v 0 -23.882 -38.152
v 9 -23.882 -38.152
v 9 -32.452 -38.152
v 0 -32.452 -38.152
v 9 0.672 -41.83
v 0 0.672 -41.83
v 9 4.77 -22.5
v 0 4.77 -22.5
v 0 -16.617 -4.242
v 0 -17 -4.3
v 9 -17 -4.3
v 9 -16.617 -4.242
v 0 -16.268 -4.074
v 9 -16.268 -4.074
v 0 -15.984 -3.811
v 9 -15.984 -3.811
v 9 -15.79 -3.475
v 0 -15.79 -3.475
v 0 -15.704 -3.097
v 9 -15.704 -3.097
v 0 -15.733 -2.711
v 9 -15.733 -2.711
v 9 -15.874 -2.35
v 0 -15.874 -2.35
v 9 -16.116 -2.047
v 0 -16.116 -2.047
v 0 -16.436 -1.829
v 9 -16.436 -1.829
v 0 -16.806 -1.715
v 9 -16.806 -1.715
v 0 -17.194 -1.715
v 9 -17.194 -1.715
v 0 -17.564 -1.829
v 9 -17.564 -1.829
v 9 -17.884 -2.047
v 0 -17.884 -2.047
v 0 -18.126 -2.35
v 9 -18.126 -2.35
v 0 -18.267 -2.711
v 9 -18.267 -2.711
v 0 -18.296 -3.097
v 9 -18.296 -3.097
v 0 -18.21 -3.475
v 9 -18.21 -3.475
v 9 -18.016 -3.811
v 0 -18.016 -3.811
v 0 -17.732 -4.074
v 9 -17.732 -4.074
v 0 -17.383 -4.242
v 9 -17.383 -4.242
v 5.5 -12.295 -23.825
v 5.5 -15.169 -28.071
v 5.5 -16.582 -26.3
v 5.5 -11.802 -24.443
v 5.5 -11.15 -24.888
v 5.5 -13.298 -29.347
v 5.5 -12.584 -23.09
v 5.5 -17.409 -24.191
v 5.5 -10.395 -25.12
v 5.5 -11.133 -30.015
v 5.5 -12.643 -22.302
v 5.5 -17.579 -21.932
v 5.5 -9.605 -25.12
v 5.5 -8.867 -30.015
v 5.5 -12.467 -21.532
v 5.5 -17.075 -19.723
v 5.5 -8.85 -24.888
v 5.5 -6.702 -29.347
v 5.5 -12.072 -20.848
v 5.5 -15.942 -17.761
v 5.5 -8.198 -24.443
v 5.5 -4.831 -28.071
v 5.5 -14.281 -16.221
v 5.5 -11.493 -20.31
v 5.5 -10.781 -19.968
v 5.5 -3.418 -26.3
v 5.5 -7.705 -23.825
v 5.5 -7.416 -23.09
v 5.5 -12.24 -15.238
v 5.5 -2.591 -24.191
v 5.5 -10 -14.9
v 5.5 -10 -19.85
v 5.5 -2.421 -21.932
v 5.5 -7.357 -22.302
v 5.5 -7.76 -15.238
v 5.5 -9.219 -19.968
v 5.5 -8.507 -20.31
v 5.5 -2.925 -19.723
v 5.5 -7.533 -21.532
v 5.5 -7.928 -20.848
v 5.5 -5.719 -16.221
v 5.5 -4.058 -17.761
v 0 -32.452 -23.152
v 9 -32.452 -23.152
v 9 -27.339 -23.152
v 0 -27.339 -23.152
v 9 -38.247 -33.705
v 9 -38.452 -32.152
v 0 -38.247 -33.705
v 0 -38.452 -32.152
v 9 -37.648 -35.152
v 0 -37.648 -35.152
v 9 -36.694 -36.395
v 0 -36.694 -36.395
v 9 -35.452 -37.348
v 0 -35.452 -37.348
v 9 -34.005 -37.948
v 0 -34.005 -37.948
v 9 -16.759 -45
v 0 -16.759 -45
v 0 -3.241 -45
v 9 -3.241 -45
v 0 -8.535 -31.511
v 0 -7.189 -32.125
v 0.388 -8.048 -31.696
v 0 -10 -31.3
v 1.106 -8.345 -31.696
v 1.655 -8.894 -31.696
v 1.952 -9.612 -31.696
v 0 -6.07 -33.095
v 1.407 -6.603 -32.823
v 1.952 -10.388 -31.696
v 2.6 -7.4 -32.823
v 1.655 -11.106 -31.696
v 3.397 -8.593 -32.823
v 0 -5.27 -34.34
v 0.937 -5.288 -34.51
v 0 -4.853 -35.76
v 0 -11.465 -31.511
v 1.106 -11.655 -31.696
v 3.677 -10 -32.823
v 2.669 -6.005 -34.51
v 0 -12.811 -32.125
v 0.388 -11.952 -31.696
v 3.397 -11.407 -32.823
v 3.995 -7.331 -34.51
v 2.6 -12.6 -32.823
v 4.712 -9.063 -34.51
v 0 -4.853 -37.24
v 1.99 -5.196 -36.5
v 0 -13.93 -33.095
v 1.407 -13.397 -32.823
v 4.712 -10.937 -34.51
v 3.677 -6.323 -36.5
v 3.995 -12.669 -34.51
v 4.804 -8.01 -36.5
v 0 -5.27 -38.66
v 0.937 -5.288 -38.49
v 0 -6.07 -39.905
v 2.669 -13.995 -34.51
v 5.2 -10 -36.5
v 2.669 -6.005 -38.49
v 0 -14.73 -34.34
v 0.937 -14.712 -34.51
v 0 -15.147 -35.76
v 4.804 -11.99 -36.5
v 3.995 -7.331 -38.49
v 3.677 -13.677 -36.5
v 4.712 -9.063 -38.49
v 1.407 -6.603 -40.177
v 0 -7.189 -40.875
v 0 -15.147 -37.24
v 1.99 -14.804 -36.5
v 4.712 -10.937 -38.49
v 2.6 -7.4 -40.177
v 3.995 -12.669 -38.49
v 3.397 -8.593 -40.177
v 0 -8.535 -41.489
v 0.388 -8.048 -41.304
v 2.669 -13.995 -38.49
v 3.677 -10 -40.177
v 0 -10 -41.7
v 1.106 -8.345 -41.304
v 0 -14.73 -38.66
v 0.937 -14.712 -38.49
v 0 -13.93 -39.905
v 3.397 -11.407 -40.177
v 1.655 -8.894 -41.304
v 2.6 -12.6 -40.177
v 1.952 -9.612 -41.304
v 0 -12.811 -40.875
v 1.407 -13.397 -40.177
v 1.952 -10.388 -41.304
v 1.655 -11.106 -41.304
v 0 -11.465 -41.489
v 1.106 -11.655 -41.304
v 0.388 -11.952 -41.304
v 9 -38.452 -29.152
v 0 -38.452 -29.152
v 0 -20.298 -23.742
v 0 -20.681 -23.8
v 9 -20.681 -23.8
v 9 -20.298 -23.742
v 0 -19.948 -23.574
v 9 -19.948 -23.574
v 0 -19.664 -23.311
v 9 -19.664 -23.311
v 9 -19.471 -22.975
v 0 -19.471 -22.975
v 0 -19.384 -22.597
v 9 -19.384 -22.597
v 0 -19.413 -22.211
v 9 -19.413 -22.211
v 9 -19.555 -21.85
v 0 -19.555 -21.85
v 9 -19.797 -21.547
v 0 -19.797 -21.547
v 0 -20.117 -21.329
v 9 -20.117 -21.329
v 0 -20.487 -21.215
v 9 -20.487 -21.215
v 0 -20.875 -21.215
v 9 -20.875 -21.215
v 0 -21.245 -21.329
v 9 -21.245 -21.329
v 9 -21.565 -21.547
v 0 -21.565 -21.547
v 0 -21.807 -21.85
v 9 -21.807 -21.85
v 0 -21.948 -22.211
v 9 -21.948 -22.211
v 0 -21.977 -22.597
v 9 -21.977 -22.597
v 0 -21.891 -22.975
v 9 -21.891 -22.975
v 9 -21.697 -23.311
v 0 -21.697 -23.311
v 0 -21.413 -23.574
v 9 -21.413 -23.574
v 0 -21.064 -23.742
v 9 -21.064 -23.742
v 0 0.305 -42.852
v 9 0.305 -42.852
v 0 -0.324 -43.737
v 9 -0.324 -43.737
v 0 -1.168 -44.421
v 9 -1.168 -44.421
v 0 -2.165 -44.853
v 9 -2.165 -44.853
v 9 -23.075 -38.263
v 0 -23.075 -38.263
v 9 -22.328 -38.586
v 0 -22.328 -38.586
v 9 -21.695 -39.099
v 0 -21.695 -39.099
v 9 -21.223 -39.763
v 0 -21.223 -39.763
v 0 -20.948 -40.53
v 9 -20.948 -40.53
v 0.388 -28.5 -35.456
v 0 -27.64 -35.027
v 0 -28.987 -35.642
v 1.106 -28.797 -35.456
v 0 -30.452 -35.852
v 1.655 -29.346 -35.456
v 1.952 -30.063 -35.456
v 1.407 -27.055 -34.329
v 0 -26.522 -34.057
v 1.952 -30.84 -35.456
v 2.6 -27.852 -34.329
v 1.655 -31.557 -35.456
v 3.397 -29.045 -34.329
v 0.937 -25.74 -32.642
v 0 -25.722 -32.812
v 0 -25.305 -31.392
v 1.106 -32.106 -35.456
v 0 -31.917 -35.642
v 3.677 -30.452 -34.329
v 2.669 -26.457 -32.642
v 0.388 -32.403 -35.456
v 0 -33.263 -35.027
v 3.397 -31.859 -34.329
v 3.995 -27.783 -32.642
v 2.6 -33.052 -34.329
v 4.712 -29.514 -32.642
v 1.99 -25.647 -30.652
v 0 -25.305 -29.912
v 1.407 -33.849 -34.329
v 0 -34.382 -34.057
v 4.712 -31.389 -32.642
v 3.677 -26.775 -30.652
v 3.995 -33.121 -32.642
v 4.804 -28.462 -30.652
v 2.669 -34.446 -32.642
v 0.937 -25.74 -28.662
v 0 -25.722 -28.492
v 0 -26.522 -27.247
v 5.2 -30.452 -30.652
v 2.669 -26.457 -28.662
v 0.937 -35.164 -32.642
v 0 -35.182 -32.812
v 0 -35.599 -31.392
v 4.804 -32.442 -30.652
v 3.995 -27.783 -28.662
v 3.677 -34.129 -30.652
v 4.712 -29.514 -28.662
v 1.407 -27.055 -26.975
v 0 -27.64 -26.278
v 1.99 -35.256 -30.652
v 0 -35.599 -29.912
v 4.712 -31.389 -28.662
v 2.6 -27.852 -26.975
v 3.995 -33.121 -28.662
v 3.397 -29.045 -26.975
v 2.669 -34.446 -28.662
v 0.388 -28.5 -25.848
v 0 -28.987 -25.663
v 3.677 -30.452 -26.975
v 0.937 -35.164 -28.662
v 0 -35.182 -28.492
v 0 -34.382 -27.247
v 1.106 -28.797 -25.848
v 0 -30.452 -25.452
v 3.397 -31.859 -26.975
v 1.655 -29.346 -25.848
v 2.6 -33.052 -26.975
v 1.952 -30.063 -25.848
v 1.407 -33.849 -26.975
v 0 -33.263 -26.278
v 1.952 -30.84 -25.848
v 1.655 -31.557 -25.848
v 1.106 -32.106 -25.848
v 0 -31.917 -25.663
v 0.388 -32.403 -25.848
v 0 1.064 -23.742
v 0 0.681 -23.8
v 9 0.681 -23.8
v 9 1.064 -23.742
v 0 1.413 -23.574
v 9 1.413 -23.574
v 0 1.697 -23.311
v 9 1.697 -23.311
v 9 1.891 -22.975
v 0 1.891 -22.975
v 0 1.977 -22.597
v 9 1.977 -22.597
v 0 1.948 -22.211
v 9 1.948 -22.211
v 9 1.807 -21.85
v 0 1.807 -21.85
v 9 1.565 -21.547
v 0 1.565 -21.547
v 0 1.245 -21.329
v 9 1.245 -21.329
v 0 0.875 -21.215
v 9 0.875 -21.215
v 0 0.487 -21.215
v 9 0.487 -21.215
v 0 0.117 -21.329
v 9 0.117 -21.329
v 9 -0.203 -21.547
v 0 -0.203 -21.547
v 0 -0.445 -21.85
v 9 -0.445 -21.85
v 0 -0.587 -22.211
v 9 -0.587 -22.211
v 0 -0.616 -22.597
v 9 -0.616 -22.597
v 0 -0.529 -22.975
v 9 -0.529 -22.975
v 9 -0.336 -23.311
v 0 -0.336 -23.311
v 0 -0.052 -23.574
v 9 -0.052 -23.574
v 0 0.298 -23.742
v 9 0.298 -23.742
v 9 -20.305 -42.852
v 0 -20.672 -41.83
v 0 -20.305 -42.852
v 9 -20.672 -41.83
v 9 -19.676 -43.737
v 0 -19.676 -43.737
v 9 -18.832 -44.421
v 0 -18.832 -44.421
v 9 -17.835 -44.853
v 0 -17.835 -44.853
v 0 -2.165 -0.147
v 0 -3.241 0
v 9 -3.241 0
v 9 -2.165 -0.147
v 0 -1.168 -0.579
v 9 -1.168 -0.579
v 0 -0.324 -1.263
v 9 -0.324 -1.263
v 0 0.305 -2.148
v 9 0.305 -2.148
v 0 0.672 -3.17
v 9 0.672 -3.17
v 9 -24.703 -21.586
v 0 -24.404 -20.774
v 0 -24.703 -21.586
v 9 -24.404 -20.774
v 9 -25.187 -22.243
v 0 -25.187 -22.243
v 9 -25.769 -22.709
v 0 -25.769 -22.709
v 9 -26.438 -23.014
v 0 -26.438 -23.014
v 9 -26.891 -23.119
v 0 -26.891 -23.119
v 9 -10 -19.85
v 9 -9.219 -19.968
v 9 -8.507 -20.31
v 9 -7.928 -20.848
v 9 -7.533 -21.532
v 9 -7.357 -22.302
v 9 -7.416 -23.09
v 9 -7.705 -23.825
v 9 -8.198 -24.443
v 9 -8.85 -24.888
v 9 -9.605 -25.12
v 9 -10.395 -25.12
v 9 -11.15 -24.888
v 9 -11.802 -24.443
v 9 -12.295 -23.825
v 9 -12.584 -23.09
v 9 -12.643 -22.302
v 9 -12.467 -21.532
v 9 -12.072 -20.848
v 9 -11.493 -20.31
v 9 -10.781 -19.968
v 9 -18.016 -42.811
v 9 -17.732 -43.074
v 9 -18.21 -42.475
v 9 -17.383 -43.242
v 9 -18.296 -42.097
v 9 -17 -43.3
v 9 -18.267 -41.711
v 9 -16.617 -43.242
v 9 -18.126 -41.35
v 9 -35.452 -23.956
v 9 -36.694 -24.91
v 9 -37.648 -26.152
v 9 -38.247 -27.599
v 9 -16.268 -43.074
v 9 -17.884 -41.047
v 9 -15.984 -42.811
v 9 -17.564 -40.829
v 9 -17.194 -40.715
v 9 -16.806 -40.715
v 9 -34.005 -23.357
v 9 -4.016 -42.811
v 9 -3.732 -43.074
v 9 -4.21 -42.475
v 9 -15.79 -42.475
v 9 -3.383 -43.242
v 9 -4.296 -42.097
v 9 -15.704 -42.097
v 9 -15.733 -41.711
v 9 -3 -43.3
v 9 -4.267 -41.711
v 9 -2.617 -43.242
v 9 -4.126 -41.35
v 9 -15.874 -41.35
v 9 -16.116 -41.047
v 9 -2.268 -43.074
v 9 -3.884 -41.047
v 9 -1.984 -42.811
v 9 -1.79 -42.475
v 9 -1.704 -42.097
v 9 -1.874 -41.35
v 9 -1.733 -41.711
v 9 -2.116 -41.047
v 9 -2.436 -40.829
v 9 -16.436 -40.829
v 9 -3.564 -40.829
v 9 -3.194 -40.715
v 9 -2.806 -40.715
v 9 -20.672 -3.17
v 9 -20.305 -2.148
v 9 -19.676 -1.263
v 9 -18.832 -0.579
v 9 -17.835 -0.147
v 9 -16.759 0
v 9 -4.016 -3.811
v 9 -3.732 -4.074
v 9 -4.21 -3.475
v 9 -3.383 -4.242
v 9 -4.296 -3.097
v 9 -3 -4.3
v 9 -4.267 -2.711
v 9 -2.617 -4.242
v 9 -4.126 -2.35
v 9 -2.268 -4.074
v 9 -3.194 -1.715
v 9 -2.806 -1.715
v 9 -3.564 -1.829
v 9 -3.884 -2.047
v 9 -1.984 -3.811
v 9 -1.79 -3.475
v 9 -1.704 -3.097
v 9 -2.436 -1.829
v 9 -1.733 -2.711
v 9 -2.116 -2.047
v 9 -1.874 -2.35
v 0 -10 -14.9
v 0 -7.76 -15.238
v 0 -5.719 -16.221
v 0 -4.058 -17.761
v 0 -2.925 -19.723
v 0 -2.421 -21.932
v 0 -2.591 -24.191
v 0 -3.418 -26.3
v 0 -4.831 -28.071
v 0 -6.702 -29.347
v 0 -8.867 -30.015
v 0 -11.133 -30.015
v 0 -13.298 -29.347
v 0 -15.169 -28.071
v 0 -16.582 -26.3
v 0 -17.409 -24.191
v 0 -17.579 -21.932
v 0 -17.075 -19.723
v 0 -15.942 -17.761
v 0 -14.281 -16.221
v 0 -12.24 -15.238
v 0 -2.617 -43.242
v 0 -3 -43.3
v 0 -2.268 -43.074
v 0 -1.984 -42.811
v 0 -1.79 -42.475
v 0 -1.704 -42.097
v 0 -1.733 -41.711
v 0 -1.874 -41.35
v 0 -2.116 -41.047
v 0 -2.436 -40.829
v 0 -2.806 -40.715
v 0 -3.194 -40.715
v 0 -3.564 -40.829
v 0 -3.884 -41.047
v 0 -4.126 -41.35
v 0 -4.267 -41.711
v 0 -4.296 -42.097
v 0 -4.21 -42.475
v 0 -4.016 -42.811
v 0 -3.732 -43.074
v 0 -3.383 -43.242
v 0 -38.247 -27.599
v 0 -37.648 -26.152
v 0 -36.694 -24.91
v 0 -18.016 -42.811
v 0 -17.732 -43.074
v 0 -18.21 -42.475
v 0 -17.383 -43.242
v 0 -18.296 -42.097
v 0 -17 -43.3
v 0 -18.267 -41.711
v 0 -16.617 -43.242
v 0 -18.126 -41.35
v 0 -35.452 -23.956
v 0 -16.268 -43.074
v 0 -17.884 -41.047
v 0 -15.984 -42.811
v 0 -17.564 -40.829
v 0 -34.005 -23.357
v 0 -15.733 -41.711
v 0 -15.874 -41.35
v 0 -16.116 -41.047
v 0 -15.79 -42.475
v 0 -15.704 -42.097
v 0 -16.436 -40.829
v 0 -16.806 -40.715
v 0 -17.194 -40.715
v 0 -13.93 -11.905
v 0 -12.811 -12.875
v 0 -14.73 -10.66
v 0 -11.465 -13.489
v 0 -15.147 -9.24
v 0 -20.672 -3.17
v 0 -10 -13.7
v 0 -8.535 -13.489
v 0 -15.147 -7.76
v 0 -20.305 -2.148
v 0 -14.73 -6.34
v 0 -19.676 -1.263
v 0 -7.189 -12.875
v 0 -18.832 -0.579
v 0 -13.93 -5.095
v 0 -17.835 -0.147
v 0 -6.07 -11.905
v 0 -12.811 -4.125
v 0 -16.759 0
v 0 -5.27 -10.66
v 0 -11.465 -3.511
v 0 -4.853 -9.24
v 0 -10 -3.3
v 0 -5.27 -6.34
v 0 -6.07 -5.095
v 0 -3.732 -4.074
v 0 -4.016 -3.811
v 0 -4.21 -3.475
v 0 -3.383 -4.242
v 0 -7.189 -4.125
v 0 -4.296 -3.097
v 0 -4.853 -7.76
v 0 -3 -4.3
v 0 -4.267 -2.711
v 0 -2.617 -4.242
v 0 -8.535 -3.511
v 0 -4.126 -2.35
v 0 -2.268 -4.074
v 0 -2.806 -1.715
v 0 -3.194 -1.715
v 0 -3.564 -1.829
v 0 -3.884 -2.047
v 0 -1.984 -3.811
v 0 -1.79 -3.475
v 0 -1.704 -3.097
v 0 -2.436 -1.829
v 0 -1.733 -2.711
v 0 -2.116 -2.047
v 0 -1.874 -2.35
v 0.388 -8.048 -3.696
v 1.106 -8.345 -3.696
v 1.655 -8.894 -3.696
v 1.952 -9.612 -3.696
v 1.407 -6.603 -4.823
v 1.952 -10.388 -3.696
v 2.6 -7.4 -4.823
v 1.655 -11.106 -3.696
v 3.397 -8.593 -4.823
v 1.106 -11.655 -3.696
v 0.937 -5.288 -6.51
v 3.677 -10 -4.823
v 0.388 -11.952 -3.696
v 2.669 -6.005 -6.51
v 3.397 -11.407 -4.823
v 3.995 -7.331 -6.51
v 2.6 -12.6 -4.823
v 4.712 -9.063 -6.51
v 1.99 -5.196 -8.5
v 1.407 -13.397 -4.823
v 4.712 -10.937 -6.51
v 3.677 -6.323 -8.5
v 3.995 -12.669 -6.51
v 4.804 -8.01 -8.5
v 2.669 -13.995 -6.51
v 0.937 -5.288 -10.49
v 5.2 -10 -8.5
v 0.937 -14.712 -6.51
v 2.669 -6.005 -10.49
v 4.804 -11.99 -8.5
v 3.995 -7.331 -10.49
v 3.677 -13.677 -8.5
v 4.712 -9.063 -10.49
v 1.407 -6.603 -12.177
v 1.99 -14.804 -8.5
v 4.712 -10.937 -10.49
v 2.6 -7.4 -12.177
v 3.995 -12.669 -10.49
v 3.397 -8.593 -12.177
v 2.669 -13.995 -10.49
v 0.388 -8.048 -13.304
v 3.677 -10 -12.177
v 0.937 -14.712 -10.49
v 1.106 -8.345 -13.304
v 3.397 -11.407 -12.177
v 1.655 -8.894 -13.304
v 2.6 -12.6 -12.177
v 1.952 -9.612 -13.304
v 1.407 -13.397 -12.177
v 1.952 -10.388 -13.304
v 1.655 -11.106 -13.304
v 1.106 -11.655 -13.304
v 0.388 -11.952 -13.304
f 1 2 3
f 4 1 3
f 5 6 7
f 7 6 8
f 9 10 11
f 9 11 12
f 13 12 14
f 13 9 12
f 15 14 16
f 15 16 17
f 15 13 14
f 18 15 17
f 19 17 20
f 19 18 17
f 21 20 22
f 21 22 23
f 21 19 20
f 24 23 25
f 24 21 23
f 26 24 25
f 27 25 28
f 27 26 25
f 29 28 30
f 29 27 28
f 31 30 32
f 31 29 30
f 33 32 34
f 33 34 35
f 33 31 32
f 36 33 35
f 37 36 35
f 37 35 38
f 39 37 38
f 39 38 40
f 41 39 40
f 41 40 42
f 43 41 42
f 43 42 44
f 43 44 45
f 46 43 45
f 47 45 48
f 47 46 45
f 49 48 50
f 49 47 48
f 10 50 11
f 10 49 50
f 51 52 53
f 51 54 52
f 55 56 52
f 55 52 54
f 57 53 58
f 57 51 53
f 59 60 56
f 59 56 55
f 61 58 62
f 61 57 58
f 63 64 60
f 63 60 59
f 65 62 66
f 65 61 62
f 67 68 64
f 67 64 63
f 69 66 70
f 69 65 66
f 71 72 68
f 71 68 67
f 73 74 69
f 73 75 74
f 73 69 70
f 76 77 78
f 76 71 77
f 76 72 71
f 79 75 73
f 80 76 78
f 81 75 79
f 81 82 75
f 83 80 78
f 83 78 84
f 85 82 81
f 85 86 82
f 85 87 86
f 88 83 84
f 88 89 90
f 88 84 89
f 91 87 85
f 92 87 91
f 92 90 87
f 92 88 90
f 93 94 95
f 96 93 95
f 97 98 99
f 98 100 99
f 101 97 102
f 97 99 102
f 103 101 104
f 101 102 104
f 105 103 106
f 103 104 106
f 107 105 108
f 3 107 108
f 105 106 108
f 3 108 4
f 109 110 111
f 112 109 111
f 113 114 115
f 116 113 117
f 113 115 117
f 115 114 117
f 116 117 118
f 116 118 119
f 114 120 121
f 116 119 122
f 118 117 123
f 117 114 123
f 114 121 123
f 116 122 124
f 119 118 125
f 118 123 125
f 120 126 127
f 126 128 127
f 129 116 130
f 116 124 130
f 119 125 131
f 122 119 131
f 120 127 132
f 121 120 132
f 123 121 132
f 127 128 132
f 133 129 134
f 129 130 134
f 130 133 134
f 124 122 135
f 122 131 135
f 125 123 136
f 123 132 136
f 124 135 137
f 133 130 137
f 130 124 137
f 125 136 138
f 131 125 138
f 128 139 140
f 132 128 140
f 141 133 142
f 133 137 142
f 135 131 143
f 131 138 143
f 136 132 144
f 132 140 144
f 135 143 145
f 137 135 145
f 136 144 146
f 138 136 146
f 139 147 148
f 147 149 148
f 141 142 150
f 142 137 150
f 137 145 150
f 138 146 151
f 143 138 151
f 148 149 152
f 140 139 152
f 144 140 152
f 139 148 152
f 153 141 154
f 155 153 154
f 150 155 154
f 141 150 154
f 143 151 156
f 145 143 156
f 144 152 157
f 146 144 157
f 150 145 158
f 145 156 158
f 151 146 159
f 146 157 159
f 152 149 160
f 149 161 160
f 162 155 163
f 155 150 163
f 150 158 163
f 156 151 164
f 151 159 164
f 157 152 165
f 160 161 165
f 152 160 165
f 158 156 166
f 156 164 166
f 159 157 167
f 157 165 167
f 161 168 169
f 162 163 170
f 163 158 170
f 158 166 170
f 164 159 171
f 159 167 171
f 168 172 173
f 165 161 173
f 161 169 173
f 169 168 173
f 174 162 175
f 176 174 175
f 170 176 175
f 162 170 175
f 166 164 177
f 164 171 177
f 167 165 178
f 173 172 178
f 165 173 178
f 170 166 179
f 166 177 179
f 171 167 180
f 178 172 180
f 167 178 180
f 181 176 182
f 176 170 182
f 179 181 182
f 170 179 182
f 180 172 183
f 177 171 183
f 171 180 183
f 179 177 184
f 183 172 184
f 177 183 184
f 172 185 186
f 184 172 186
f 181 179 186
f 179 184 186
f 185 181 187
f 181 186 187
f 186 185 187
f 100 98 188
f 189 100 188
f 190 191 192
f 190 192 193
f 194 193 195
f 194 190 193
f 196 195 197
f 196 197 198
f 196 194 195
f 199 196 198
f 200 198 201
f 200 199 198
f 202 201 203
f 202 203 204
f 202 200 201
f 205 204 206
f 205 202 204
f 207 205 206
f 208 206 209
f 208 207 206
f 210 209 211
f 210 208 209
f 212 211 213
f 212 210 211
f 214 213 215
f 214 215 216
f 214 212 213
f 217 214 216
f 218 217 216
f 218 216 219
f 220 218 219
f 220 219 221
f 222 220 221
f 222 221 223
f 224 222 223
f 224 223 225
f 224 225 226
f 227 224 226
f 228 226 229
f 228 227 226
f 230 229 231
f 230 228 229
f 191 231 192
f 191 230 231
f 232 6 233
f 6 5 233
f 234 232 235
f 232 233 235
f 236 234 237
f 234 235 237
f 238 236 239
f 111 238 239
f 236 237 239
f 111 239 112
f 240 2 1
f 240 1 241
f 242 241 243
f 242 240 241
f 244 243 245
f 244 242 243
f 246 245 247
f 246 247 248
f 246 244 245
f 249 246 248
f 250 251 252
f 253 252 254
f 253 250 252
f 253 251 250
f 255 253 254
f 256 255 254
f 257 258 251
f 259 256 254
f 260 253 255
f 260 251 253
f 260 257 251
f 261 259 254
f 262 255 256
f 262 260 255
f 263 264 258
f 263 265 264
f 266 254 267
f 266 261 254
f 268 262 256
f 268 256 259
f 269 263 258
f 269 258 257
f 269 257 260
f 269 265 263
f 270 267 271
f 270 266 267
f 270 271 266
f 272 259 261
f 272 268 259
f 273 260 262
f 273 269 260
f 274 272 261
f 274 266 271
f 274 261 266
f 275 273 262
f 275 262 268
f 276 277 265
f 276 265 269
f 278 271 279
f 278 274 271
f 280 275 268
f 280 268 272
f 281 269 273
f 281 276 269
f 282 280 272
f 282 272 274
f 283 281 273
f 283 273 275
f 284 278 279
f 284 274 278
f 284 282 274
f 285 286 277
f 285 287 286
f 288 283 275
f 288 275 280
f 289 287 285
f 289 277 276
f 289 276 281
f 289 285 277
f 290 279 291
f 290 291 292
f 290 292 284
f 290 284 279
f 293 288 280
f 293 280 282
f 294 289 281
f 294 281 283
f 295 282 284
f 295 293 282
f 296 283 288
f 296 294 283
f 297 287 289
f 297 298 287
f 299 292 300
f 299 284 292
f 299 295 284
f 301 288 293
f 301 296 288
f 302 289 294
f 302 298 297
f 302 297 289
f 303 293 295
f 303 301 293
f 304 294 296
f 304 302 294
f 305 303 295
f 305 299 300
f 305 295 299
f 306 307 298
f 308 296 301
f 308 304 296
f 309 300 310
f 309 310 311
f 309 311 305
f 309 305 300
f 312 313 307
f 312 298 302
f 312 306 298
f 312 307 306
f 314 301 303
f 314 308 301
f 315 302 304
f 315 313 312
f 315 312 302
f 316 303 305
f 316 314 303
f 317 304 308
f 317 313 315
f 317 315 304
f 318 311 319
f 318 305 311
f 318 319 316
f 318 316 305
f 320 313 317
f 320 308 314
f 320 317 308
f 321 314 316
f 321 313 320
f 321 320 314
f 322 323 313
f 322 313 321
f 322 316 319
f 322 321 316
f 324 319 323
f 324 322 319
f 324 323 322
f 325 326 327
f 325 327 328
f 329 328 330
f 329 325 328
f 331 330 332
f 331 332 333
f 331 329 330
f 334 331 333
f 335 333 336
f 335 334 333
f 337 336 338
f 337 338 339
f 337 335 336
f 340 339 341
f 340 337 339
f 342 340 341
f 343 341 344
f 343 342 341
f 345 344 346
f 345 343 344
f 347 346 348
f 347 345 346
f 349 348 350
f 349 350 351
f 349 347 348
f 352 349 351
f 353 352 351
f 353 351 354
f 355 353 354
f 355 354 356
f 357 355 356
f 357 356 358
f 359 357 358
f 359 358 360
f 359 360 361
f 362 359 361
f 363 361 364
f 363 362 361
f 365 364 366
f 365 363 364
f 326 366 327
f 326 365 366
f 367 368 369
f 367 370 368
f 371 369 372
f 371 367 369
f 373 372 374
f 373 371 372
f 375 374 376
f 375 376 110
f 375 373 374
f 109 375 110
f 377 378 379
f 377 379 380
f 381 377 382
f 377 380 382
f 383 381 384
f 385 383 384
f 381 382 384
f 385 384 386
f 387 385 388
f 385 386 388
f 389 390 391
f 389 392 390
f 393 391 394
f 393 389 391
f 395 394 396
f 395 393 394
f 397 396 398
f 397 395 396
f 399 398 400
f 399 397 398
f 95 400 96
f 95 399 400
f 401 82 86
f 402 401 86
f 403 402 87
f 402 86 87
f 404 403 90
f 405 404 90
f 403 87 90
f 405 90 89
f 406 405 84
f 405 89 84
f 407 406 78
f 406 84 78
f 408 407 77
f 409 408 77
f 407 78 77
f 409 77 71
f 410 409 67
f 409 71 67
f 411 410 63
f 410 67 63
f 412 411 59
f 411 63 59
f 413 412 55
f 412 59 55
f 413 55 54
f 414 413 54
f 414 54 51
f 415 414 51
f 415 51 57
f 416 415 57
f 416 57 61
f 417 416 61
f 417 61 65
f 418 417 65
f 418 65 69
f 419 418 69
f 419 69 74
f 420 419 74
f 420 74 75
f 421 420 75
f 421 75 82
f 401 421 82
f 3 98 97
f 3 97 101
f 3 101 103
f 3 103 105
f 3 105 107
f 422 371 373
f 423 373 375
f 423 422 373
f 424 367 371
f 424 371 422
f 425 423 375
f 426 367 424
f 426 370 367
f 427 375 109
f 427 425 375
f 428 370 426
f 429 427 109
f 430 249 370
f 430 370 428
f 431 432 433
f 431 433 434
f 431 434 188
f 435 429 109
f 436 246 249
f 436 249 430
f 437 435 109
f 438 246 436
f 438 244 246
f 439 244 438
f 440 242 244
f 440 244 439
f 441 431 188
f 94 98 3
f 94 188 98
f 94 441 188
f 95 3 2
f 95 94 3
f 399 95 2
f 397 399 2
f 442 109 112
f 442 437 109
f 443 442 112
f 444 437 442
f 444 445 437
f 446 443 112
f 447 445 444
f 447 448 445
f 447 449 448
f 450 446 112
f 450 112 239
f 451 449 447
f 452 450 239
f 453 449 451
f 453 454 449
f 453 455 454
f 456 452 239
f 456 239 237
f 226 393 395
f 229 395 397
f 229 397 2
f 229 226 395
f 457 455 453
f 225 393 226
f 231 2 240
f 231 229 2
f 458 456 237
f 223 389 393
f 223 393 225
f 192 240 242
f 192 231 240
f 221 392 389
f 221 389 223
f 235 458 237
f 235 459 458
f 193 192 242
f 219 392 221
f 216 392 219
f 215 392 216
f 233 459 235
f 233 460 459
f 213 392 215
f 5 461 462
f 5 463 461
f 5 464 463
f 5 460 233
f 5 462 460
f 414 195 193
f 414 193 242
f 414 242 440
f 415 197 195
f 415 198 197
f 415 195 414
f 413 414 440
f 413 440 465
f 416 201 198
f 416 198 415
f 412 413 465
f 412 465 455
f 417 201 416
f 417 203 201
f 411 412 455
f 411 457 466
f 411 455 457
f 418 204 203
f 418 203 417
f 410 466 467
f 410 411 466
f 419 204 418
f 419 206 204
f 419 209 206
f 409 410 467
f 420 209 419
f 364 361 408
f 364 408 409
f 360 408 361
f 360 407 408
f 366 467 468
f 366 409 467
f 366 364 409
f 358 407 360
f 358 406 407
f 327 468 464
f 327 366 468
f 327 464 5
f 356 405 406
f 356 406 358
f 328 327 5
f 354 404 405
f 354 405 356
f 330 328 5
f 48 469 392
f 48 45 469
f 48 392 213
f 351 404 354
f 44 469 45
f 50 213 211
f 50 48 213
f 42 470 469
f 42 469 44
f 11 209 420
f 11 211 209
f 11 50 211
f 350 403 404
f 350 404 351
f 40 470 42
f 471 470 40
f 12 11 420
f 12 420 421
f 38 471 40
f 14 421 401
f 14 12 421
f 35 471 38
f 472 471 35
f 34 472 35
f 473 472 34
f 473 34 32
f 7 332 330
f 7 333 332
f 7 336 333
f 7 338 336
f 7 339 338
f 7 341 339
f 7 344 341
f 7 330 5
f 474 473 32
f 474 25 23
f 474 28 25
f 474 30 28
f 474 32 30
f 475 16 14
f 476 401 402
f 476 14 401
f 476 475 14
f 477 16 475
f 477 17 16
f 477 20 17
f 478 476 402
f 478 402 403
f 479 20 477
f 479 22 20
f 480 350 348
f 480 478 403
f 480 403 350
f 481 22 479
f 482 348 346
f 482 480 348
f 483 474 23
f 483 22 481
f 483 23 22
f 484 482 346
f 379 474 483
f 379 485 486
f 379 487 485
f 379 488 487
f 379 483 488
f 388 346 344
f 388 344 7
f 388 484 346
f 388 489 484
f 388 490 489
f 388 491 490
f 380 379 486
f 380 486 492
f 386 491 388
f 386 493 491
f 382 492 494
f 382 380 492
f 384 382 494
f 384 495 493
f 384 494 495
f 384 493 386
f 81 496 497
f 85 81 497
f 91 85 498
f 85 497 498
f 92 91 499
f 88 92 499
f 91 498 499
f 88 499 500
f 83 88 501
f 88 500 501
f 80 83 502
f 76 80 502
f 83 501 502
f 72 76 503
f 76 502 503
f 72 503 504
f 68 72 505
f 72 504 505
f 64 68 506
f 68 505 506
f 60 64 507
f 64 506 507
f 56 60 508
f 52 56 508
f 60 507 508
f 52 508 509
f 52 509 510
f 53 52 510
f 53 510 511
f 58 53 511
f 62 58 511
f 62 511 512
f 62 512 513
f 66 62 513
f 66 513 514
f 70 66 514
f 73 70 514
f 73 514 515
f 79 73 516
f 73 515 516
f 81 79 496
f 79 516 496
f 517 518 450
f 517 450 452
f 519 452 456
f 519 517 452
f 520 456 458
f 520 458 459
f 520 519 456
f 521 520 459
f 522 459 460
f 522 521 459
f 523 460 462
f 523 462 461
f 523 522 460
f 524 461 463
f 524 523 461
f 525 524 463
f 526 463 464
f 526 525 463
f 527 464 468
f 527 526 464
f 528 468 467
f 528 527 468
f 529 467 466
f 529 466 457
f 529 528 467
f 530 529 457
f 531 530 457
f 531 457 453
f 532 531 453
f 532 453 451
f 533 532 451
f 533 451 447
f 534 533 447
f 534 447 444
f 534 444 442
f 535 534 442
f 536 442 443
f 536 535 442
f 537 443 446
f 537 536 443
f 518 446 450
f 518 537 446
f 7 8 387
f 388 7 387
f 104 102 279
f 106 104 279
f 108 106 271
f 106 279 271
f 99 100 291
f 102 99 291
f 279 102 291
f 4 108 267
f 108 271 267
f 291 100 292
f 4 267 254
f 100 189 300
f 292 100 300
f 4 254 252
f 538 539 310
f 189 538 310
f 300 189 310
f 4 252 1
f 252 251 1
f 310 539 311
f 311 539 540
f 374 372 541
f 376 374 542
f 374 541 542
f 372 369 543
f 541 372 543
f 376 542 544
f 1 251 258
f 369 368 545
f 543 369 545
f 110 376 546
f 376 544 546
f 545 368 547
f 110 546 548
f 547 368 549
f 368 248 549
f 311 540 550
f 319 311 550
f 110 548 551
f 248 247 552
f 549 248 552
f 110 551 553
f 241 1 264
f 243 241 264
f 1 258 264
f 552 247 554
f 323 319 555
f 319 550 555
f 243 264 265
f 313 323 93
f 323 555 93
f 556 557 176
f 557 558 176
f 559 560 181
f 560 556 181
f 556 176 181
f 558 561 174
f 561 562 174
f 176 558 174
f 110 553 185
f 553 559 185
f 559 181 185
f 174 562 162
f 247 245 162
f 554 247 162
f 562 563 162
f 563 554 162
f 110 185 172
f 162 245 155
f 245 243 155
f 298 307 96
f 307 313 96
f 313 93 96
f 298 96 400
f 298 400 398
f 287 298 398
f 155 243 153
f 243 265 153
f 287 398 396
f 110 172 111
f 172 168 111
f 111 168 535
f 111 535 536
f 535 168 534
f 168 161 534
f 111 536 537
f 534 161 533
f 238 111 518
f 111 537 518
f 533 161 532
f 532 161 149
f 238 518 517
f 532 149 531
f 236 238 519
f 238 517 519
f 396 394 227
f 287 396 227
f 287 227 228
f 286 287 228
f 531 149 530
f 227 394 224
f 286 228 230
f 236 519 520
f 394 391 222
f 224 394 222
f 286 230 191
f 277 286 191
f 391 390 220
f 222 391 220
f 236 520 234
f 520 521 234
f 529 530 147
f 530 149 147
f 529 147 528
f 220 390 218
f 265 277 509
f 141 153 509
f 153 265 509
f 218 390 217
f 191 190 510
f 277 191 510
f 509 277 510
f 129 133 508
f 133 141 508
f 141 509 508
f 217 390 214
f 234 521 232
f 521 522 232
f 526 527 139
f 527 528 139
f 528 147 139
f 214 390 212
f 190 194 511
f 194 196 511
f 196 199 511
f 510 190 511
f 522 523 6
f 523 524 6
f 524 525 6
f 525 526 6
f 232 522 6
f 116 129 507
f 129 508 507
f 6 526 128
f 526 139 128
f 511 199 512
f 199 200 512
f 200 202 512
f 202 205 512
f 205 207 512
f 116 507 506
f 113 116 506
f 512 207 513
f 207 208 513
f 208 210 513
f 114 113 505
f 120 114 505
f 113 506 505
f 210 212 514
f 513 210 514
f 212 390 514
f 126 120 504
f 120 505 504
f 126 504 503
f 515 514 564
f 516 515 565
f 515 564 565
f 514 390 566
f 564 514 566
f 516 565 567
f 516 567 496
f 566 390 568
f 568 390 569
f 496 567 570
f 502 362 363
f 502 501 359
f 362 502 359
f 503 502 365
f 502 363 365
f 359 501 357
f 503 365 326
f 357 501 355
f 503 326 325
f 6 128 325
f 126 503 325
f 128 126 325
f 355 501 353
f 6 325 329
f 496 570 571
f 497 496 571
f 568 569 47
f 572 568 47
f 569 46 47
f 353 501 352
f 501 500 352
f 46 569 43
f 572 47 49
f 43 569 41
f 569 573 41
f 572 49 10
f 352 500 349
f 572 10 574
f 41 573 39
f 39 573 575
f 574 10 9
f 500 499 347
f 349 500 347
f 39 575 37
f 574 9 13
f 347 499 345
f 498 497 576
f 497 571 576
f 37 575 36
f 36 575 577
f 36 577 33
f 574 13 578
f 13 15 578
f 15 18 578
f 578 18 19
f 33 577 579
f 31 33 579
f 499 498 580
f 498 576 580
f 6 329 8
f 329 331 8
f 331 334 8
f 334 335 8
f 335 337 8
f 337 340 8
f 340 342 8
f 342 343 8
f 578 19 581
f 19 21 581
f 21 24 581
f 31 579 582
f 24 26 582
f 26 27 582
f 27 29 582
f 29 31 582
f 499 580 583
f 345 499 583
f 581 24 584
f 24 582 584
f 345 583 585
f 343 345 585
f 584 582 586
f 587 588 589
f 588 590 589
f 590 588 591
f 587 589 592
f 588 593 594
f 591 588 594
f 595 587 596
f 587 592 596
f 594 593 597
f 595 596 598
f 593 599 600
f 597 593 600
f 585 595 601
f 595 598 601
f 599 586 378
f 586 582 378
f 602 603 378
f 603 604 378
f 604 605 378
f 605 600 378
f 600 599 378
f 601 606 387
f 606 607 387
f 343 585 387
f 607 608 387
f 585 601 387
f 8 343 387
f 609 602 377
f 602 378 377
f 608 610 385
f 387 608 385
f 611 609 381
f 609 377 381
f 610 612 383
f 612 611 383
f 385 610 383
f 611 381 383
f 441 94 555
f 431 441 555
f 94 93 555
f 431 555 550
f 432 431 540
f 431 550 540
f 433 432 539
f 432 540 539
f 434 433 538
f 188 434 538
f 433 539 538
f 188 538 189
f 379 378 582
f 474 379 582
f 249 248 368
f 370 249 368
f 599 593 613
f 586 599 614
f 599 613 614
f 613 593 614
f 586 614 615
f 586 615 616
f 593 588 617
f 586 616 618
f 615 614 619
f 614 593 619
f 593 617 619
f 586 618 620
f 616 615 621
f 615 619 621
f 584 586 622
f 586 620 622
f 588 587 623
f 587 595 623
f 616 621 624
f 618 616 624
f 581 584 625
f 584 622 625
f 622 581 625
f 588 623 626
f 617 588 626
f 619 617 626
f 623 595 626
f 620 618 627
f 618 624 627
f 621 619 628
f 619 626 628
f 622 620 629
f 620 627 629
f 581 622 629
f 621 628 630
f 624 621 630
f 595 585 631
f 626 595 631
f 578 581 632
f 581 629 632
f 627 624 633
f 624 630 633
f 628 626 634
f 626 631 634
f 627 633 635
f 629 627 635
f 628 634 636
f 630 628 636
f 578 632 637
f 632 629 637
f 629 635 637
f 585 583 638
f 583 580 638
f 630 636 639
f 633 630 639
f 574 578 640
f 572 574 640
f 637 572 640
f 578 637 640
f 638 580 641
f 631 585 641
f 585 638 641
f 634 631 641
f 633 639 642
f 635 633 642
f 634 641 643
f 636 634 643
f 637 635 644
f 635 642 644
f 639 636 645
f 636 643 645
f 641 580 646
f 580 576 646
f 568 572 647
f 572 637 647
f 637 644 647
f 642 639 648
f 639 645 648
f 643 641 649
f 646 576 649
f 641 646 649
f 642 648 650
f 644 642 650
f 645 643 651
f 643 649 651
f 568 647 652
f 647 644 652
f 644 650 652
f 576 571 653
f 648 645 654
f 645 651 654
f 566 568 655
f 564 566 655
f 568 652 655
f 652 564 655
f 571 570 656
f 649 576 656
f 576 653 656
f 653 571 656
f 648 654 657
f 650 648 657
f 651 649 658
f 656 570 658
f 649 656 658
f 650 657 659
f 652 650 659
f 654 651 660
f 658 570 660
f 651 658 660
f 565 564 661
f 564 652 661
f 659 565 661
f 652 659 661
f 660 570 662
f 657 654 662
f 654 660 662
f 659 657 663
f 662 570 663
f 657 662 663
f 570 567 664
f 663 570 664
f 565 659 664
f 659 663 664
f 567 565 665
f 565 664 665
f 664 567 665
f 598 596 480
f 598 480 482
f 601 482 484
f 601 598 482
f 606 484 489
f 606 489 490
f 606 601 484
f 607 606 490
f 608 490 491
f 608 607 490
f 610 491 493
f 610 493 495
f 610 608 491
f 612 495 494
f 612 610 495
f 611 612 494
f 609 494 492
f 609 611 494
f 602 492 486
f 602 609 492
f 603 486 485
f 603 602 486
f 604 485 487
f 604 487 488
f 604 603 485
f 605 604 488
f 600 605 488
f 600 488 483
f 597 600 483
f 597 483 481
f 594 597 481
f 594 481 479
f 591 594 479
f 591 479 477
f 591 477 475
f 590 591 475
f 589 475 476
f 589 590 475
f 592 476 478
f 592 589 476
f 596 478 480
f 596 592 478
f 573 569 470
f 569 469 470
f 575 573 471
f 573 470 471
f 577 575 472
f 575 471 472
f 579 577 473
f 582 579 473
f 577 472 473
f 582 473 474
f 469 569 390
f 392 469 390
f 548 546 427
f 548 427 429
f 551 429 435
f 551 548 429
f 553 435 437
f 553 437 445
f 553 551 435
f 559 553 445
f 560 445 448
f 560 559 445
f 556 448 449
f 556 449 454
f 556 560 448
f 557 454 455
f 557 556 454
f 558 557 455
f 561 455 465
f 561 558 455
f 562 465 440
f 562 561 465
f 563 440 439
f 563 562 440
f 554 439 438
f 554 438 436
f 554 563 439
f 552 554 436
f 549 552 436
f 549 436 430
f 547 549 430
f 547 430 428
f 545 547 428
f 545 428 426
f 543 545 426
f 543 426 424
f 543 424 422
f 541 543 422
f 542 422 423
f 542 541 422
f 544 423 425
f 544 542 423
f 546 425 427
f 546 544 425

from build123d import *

# Parameters (mm, degrees)
SKETCH1_R           = 1.3
BOSS_EXTRUDE1_DEPTH = 9
CUT_REVOLVE3_ANGLE  = 180
SKETCH8_R           = 7.6
CUT_EXTRUDE4_DEPTH  = 5.5
SKETCH9_R           = 2.65
CUT_EXTRUDE5_DEPTH  = 52.660312042
BOSS_EXTRUDE7_DEPTH = 9
CUT_REVOLVE4_ANGLE  = 180
FILLET1_R           = 6
FILLET2_R           = 4
FILLET3_R           = 3
FILLET4_R           = 3


with BuildPart() as part:
    # Sketch1 → Boss-Extrude1 (new body)
    with BuildSketch(Plane(origin=(0, 0, 0), x_dir=(0, 0, -1), z_dir=(1, 0, 0))):
        Polygon((0, -20), (22.5, -24.769696007), (45, -20), (45, 0), (22.5, 4.769696007), (0, 0), align=None)
        with Locations((22.5, -20.680807118)):
            Circle(SKETCH1_R, mode=Mode.SUBTRACT)
        with Locations((22.5, 0.680807118)):
            Circle(SKETCH1_R, mode=Mode.SUBTRACT)
        with Locations((42, -17)):
            Circle(SKETCH1_R, mode=Mode.SUBTRACT)
        with Locations((3, -17)):
            Circle(SKETCH1_R, mode=Mode.SUBTRACT)
        with Locations((3, -3)):
            Circle(SKETCH1_R, mode=Mode.SUBTRACT)
        with Locations((42, -3)):
            Circle(SKETCH1_R, mode=Mode.SUBTRACT)
    extrude(amount=BOSS_EXTRUDE1_DEPTH)

    # Sketch7 → Cut-Revolve3 (revolve, cut)
    with BuildSketch(Plane.ZY):
        with BuildLine():
            Line((-41.7, -10), (-31.3, -10))
            ThreePointArc((-31.3, -10), (-36.5, -4.8), (-41.7, -10))
        make_face()
        with BuildLine():
            Line((-13.7, -10), (-3.3, -10))
            ThreePointArc((-3.3, -10), (-8.5, -4.8), (-13.7, -10))
        make_face()
    revolve(axis=Axis((0, -10, -41.7), (0, 0, -1)), revolution_arc=CUT_REVOLVE3_ANGLE, mode=Mode.SUBTRACT)

    # Sketch8 → Cut-Extrude4 (cut)
    with BuildSketch(Plane.ZY):
        with Locations((-22.5, -10)):
            Circle(SKETCH8_R)
    extrude(amount=-CUT_EXTRUDE4_DEPTH, mode=Mode.SUBTRACT)

    # Sketch9 → Cut-Extrude5 (cut, through all)
    with BuildSketch(Plane.ZY.offset(-5.5)):
        with Locations((-22.5, -10)):
            Circle(SKETCH9_R)
    extrude(amount=-CUT_EXTRUDE5_DEPTH, mode=Mode.SUBTRACT)

    # Sketch16 → Boss-Extrude7 (add)
    with BuildSketch(Plane(origin=(9, 0, 0), x_dir=(0, 0, -1), z_dir=(1, 0, 0))):
        Polygon((38.152173913, -21.451646611), (38.152173913, -38.451646611), (23.152173913, -38.451646611), (23.152173913, -24.631443949), align=None)
    extrude(amount=-BOSS_EXTRUDE7_DEPTH)

    # Sketch17 → Cut-Revolve4 (revolve, cut)
    with BuildSketch(Plane.ZY):
        with BuildLine():
            Line((-25.452173913, -30.451646611), (-35.852173913, -30.451646611))
            ThreePointArc((-35.852173913, -30.451646611), (-30.652173913, -25.251646611), (-25.452173913, -30.451646611))
        make_face()
    revolve(axis=Axis((0, -30.451646611, -25.452173913), (0, 0, -1)), revolution_arc=CUT_REVOLVE4_ANGLE, mode=Mode.SUBTRACT)

    # Fillet1
    fillet1_edges = [part.edges().sort_by_distance(p)[0] for p in [
        (4.5, -38.451646611, -38.152173913),
        (4.5, -38.451646611, -23.152173913),
    ]]
    fillet(fillet1_edges, radius=FILLET1_R)

    # Fillet2
    fillet2_edges = [part.edges().sort_by_distance(p)[0] for p in [
        (4.5, -20, -45),
        (4.5, -20, 0),
        (4.5, 0, 0),
        (4.5, 0, -45),
    ]]
    fillet(fillet2_edges, radius=FILLET2_R)

    # Fillet3
    # the kernel refuses this fillet: 3 mm, written as the material it adds along each edge
    with BuildSketch(Plane(origin=(9, -24.631443949, -23.152173913), x_dir=(0, -0.20737808726534282, 0.9782608695650501), z_dir=(-1, 0, 0))) as fillet3_piece_1:
        with BuildLine():
            CenterArc((3.350740319, -1.340055458), FILLET3_R, 153.468795145, 38.499950409)
            Line((0.41595771, -1.96218972), (0.357262058, -1.974632405))
            Line((0.357262058, -1.974632405), (-0.058695652, -0.012442685))
            Line((-0.058695652, -0.012442685), (0, 0.06))
            ThreePointArc((0, 0.06), (0.333333333, 0.06), (0.612985194, 0.026801109))
            Line((0.612985194, 0.026801109), (0.666666667, 0))
        make_face()
    extrude(amount=9)
    with BuildSketch(Plane(origin=(9, -21.451646611, -38.152173913), x_dir=(0, -1, 0), z_dir=(-1, 0, 0))) as fillet3_piece_2:
        with BuildLine():
            CenterArc((FILLET3_R * 0.810235733018, -FILLET3_R), FILLET3_R, 90, 78.031254445)
            Line((-FILLET3_R * 0.168025136547, -FILLET3_R * 0.792621912735), (-FILLET3_R * 0.187590353938, -FILLET3_R * 0.78847435099))
            Line((-FILLET3_R * 0.187590353938, -FILLET3_R * 0.78847435099), (-FILLET3_R * 0.0162047146604, FILLET3_R * 0.02))
            Line((-FILLET3_R * 0.0162047146604, FILLET3_R * 0.02), (FILLET3_R * 0.810235733018, FILLET3_R * 0.02))
            Line((FILLET3_R * 0.810235733018, FILLET3_R * 0.02), (FILLET3_R * 0.810235733018, 0))
        make_face()
    extrude(amount=9)

    # Fillet4
    fillet4_edges = [part.edges().sort_by_distance(p)[0] for p in [
        (4.5, -24.769696007, -22.5),
    ]]
    fillet(fillet4_edges, radius=FILLET4_R)


solid = part.part
